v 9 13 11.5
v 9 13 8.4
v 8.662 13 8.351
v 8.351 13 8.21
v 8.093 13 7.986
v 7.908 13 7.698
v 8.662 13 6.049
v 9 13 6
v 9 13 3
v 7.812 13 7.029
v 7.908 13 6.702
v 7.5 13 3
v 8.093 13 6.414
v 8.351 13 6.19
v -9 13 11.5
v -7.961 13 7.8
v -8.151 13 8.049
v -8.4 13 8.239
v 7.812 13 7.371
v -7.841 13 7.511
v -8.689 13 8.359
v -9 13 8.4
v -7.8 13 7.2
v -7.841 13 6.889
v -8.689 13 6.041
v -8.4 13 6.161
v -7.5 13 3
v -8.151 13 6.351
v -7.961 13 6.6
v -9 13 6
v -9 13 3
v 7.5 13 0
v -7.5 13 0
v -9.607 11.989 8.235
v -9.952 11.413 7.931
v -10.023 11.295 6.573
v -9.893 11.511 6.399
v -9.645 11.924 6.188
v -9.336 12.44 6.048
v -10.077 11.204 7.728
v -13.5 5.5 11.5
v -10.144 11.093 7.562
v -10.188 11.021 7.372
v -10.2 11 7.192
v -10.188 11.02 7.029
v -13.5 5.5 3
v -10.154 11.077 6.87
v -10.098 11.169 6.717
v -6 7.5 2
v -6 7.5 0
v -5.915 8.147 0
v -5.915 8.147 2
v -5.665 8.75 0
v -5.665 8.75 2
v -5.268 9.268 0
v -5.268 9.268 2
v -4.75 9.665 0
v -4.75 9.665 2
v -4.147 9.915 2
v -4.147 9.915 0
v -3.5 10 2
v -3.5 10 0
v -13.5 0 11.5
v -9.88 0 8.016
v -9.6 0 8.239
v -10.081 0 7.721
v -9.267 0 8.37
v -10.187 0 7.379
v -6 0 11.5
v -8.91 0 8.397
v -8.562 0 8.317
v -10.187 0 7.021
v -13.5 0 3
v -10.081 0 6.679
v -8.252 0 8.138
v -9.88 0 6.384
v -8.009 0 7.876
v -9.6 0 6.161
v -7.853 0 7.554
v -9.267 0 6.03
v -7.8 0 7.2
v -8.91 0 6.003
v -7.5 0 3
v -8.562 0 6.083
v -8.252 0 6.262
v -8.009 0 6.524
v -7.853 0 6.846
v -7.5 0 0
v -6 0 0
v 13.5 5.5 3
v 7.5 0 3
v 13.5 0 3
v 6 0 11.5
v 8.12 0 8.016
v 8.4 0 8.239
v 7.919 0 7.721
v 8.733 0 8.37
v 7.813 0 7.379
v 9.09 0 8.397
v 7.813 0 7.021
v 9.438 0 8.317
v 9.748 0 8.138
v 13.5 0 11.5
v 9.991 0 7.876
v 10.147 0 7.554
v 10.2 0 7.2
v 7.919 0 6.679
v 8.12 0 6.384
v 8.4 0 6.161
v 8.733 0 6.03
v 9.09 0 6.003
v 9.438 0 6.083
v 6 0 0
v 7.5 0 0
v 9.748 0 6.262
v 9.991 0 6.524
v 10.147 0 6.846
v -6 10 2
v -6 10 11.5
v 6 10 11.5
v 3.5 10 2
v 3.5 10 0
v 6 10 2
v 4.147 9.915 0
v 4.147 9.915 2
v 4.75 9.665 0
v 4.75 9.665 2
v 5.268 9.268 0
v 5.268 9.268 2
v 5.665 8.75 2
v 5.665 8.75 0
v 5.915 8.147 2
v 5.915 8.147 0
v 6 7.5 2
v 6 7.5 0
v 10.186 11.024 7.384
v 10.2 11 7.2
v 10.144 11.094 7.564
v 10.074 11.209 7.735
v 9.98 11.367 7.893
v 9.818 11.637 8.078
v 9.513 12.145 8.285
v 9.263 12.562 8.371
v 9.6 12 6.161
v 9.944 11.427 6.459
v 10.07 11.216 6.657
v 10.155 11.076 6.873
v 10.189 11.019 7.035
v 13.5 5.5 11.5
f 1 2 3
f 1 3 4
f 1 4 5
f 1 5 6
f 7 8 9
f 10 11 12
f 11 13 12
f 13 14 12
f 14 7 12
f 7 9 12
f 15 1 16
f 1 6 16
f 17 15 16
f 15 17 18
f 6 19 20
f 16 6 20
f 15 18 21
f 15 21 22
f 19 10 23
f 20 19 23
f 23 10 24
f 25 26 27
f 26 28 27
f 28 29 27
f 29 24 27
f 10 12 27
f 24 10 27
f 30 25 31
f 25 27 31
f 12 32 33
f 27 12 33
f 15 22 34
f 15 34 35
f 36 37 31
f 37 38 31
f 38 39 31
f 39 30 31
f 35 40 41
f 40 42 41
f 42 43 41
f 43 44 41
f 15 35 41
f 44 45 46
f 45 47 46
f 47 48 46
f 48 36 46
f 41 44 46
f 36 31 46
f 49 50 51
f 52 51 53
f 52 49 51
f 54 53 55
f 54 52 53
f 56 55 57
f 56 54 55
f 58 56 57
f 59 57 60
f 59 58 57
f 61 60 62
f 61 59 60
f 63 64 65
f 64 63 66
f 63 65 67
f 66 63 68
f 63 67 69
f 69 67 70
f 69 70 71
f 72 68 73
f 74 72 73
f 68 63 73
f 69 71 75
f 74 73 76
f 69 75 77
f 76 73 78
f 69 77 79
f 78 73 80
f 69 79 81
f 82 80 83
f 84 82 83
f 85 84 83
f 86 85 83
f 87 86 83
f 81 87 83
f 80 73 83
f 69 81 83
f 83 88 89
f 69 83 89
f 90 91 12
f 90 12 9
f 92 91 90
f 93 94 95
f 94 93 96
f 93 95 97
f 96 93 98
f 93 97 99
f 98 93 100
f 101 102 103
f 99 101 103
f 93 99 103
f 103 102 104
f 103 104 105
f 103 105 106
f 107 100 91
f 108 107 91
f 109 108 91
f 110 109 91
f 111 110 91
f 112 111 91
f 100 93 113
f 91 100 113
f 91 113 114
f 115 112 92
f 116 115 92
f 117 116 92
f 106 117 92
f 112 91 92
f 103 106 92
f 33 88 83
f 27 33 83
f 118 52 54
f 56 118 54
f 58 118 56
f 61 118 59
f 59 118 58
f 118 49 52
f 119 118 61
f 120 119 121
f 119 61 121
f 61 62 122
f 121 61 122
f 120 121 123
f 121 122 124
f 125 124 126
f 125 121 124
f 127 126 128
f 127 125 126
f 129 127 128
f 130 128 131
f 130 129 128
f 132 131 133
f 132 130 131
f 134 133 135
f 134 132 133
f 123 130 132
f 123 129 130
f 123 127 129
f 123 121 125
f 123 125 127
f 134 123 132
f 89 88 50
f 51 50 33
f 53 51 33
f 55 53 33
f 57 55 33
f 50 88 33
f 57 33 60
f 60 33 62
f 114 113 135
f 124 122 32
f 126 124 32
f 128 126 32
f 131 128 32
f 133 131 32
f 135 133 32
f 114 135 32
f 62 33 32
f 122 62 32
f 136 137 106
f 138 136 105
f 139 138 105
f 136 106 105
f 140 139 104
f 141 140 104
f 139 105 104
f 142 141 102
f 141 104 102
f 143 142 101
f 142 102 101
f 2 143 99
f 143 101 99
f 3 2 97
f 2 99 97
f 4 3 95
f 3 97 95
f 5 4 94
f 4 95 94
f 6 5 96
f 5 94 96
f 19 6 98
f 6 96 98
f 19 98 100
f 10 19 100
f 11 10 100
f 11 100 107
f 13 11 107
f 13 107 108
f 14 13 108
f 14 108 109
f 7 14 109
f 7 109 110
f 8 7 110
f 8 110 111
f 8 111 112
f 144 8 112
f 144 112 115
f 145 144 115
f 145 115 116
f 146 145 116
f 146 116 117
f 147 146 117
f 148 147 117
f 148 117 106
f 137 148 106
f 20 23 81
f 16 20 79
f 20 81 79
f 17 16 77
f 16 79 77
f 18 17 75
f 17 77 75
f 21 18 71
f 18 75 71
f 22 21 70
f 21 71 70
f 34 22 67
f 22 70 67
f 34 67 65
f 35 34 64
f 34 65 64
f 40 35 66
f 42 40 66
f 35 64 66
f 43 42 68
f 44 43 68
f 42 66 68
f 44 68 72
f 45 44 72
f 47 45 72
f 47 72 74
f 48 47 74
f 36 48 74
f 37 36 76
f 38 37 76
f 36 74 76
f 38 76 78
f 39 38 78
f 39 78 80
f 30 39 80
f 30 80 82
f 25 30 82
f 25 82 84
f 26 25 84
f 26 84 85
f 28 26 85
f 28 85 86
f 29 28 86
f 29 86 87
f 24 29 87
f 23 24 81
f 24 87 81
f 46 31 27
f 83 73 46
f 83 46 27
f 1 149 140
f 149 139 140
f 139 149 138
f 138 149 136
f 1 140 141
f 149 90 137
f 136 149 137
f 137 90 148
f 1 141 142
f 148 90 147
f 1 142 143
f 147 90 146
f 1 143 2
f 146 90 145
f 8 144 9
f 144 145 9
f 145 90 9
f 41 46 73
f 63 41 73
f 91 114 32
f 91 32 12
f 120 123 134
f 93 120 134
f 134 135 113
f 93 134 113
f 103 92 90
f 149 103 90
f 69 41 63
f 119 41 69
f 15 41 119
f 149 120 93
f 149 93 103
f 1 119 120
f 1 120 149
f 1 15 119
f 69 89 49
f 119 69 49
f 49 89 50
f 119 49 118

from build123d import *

# Parameters (mm, degrees)
F1_DEPTH = 11.5
F2_R     = 1.2
F3_DEPTH = 25
F4_R     = 2.5
F5_W     = 12
F5_H     = 9.5
F6_DEPTH = 10.001
F7_W     = 6
F7_H     = 3
F8_DEPTH = 13.001


with BuildPart() as f1:
    # F0 (on Top) → F1 (new body)
    with BuildSketch(Plane.XY):
        Polygon((-13.5, 5.5), (-13.5, 0), (-6, 0), (-6, 10), (6, 10), (6, 0), (13.5, 0), (13.5, 5.5), (9, 13), (-9, 13), align=None)
    extrude(amount=F1_DEPTH)

    # F2 (on face) → F3 (cut)
    with BuildSketch(Plane.XZ):
        with Locations((-9, 7.2)):
            Circle(F2_R)
        with Locations((9, 7.2)):
            Circle(F2_R)
    extrude(amount=-F3_DEPTH, mode=Mode.SUBTRACT)

    # F4
    f4_edges = [f1.edges().sort_by_distance(p)[0] for p in [
        (-6, 10, 5.75),
        (6, 10, 5.75),
    ]]
    fillet(f4_edges, radius=F4_R)

    # F5 (on face) → F6 (cut, through all)
    with BuildSketch(Plane.XZ.offset(-10)):
        with Locations((0, 6.75)):
            Rectangle(F5_W, F5_H)
    extrude(amount=F6_DEPTH, mode=Mode.SUBTRACT)

    # F7 (on face) → F8 (cut, through all)
    with BuildSketch(Plane.XZ):
        with Locations((-10.5, 1.5)):
            Rectangle(F7_W, F7_H)
        with Locations((10.5, 1.5)):
            Rectangle(F7_W, F7_H)
    extrude(amount=-F8_DEPTH, mode=Mode.SUBTRACT)


solid = f1.part
